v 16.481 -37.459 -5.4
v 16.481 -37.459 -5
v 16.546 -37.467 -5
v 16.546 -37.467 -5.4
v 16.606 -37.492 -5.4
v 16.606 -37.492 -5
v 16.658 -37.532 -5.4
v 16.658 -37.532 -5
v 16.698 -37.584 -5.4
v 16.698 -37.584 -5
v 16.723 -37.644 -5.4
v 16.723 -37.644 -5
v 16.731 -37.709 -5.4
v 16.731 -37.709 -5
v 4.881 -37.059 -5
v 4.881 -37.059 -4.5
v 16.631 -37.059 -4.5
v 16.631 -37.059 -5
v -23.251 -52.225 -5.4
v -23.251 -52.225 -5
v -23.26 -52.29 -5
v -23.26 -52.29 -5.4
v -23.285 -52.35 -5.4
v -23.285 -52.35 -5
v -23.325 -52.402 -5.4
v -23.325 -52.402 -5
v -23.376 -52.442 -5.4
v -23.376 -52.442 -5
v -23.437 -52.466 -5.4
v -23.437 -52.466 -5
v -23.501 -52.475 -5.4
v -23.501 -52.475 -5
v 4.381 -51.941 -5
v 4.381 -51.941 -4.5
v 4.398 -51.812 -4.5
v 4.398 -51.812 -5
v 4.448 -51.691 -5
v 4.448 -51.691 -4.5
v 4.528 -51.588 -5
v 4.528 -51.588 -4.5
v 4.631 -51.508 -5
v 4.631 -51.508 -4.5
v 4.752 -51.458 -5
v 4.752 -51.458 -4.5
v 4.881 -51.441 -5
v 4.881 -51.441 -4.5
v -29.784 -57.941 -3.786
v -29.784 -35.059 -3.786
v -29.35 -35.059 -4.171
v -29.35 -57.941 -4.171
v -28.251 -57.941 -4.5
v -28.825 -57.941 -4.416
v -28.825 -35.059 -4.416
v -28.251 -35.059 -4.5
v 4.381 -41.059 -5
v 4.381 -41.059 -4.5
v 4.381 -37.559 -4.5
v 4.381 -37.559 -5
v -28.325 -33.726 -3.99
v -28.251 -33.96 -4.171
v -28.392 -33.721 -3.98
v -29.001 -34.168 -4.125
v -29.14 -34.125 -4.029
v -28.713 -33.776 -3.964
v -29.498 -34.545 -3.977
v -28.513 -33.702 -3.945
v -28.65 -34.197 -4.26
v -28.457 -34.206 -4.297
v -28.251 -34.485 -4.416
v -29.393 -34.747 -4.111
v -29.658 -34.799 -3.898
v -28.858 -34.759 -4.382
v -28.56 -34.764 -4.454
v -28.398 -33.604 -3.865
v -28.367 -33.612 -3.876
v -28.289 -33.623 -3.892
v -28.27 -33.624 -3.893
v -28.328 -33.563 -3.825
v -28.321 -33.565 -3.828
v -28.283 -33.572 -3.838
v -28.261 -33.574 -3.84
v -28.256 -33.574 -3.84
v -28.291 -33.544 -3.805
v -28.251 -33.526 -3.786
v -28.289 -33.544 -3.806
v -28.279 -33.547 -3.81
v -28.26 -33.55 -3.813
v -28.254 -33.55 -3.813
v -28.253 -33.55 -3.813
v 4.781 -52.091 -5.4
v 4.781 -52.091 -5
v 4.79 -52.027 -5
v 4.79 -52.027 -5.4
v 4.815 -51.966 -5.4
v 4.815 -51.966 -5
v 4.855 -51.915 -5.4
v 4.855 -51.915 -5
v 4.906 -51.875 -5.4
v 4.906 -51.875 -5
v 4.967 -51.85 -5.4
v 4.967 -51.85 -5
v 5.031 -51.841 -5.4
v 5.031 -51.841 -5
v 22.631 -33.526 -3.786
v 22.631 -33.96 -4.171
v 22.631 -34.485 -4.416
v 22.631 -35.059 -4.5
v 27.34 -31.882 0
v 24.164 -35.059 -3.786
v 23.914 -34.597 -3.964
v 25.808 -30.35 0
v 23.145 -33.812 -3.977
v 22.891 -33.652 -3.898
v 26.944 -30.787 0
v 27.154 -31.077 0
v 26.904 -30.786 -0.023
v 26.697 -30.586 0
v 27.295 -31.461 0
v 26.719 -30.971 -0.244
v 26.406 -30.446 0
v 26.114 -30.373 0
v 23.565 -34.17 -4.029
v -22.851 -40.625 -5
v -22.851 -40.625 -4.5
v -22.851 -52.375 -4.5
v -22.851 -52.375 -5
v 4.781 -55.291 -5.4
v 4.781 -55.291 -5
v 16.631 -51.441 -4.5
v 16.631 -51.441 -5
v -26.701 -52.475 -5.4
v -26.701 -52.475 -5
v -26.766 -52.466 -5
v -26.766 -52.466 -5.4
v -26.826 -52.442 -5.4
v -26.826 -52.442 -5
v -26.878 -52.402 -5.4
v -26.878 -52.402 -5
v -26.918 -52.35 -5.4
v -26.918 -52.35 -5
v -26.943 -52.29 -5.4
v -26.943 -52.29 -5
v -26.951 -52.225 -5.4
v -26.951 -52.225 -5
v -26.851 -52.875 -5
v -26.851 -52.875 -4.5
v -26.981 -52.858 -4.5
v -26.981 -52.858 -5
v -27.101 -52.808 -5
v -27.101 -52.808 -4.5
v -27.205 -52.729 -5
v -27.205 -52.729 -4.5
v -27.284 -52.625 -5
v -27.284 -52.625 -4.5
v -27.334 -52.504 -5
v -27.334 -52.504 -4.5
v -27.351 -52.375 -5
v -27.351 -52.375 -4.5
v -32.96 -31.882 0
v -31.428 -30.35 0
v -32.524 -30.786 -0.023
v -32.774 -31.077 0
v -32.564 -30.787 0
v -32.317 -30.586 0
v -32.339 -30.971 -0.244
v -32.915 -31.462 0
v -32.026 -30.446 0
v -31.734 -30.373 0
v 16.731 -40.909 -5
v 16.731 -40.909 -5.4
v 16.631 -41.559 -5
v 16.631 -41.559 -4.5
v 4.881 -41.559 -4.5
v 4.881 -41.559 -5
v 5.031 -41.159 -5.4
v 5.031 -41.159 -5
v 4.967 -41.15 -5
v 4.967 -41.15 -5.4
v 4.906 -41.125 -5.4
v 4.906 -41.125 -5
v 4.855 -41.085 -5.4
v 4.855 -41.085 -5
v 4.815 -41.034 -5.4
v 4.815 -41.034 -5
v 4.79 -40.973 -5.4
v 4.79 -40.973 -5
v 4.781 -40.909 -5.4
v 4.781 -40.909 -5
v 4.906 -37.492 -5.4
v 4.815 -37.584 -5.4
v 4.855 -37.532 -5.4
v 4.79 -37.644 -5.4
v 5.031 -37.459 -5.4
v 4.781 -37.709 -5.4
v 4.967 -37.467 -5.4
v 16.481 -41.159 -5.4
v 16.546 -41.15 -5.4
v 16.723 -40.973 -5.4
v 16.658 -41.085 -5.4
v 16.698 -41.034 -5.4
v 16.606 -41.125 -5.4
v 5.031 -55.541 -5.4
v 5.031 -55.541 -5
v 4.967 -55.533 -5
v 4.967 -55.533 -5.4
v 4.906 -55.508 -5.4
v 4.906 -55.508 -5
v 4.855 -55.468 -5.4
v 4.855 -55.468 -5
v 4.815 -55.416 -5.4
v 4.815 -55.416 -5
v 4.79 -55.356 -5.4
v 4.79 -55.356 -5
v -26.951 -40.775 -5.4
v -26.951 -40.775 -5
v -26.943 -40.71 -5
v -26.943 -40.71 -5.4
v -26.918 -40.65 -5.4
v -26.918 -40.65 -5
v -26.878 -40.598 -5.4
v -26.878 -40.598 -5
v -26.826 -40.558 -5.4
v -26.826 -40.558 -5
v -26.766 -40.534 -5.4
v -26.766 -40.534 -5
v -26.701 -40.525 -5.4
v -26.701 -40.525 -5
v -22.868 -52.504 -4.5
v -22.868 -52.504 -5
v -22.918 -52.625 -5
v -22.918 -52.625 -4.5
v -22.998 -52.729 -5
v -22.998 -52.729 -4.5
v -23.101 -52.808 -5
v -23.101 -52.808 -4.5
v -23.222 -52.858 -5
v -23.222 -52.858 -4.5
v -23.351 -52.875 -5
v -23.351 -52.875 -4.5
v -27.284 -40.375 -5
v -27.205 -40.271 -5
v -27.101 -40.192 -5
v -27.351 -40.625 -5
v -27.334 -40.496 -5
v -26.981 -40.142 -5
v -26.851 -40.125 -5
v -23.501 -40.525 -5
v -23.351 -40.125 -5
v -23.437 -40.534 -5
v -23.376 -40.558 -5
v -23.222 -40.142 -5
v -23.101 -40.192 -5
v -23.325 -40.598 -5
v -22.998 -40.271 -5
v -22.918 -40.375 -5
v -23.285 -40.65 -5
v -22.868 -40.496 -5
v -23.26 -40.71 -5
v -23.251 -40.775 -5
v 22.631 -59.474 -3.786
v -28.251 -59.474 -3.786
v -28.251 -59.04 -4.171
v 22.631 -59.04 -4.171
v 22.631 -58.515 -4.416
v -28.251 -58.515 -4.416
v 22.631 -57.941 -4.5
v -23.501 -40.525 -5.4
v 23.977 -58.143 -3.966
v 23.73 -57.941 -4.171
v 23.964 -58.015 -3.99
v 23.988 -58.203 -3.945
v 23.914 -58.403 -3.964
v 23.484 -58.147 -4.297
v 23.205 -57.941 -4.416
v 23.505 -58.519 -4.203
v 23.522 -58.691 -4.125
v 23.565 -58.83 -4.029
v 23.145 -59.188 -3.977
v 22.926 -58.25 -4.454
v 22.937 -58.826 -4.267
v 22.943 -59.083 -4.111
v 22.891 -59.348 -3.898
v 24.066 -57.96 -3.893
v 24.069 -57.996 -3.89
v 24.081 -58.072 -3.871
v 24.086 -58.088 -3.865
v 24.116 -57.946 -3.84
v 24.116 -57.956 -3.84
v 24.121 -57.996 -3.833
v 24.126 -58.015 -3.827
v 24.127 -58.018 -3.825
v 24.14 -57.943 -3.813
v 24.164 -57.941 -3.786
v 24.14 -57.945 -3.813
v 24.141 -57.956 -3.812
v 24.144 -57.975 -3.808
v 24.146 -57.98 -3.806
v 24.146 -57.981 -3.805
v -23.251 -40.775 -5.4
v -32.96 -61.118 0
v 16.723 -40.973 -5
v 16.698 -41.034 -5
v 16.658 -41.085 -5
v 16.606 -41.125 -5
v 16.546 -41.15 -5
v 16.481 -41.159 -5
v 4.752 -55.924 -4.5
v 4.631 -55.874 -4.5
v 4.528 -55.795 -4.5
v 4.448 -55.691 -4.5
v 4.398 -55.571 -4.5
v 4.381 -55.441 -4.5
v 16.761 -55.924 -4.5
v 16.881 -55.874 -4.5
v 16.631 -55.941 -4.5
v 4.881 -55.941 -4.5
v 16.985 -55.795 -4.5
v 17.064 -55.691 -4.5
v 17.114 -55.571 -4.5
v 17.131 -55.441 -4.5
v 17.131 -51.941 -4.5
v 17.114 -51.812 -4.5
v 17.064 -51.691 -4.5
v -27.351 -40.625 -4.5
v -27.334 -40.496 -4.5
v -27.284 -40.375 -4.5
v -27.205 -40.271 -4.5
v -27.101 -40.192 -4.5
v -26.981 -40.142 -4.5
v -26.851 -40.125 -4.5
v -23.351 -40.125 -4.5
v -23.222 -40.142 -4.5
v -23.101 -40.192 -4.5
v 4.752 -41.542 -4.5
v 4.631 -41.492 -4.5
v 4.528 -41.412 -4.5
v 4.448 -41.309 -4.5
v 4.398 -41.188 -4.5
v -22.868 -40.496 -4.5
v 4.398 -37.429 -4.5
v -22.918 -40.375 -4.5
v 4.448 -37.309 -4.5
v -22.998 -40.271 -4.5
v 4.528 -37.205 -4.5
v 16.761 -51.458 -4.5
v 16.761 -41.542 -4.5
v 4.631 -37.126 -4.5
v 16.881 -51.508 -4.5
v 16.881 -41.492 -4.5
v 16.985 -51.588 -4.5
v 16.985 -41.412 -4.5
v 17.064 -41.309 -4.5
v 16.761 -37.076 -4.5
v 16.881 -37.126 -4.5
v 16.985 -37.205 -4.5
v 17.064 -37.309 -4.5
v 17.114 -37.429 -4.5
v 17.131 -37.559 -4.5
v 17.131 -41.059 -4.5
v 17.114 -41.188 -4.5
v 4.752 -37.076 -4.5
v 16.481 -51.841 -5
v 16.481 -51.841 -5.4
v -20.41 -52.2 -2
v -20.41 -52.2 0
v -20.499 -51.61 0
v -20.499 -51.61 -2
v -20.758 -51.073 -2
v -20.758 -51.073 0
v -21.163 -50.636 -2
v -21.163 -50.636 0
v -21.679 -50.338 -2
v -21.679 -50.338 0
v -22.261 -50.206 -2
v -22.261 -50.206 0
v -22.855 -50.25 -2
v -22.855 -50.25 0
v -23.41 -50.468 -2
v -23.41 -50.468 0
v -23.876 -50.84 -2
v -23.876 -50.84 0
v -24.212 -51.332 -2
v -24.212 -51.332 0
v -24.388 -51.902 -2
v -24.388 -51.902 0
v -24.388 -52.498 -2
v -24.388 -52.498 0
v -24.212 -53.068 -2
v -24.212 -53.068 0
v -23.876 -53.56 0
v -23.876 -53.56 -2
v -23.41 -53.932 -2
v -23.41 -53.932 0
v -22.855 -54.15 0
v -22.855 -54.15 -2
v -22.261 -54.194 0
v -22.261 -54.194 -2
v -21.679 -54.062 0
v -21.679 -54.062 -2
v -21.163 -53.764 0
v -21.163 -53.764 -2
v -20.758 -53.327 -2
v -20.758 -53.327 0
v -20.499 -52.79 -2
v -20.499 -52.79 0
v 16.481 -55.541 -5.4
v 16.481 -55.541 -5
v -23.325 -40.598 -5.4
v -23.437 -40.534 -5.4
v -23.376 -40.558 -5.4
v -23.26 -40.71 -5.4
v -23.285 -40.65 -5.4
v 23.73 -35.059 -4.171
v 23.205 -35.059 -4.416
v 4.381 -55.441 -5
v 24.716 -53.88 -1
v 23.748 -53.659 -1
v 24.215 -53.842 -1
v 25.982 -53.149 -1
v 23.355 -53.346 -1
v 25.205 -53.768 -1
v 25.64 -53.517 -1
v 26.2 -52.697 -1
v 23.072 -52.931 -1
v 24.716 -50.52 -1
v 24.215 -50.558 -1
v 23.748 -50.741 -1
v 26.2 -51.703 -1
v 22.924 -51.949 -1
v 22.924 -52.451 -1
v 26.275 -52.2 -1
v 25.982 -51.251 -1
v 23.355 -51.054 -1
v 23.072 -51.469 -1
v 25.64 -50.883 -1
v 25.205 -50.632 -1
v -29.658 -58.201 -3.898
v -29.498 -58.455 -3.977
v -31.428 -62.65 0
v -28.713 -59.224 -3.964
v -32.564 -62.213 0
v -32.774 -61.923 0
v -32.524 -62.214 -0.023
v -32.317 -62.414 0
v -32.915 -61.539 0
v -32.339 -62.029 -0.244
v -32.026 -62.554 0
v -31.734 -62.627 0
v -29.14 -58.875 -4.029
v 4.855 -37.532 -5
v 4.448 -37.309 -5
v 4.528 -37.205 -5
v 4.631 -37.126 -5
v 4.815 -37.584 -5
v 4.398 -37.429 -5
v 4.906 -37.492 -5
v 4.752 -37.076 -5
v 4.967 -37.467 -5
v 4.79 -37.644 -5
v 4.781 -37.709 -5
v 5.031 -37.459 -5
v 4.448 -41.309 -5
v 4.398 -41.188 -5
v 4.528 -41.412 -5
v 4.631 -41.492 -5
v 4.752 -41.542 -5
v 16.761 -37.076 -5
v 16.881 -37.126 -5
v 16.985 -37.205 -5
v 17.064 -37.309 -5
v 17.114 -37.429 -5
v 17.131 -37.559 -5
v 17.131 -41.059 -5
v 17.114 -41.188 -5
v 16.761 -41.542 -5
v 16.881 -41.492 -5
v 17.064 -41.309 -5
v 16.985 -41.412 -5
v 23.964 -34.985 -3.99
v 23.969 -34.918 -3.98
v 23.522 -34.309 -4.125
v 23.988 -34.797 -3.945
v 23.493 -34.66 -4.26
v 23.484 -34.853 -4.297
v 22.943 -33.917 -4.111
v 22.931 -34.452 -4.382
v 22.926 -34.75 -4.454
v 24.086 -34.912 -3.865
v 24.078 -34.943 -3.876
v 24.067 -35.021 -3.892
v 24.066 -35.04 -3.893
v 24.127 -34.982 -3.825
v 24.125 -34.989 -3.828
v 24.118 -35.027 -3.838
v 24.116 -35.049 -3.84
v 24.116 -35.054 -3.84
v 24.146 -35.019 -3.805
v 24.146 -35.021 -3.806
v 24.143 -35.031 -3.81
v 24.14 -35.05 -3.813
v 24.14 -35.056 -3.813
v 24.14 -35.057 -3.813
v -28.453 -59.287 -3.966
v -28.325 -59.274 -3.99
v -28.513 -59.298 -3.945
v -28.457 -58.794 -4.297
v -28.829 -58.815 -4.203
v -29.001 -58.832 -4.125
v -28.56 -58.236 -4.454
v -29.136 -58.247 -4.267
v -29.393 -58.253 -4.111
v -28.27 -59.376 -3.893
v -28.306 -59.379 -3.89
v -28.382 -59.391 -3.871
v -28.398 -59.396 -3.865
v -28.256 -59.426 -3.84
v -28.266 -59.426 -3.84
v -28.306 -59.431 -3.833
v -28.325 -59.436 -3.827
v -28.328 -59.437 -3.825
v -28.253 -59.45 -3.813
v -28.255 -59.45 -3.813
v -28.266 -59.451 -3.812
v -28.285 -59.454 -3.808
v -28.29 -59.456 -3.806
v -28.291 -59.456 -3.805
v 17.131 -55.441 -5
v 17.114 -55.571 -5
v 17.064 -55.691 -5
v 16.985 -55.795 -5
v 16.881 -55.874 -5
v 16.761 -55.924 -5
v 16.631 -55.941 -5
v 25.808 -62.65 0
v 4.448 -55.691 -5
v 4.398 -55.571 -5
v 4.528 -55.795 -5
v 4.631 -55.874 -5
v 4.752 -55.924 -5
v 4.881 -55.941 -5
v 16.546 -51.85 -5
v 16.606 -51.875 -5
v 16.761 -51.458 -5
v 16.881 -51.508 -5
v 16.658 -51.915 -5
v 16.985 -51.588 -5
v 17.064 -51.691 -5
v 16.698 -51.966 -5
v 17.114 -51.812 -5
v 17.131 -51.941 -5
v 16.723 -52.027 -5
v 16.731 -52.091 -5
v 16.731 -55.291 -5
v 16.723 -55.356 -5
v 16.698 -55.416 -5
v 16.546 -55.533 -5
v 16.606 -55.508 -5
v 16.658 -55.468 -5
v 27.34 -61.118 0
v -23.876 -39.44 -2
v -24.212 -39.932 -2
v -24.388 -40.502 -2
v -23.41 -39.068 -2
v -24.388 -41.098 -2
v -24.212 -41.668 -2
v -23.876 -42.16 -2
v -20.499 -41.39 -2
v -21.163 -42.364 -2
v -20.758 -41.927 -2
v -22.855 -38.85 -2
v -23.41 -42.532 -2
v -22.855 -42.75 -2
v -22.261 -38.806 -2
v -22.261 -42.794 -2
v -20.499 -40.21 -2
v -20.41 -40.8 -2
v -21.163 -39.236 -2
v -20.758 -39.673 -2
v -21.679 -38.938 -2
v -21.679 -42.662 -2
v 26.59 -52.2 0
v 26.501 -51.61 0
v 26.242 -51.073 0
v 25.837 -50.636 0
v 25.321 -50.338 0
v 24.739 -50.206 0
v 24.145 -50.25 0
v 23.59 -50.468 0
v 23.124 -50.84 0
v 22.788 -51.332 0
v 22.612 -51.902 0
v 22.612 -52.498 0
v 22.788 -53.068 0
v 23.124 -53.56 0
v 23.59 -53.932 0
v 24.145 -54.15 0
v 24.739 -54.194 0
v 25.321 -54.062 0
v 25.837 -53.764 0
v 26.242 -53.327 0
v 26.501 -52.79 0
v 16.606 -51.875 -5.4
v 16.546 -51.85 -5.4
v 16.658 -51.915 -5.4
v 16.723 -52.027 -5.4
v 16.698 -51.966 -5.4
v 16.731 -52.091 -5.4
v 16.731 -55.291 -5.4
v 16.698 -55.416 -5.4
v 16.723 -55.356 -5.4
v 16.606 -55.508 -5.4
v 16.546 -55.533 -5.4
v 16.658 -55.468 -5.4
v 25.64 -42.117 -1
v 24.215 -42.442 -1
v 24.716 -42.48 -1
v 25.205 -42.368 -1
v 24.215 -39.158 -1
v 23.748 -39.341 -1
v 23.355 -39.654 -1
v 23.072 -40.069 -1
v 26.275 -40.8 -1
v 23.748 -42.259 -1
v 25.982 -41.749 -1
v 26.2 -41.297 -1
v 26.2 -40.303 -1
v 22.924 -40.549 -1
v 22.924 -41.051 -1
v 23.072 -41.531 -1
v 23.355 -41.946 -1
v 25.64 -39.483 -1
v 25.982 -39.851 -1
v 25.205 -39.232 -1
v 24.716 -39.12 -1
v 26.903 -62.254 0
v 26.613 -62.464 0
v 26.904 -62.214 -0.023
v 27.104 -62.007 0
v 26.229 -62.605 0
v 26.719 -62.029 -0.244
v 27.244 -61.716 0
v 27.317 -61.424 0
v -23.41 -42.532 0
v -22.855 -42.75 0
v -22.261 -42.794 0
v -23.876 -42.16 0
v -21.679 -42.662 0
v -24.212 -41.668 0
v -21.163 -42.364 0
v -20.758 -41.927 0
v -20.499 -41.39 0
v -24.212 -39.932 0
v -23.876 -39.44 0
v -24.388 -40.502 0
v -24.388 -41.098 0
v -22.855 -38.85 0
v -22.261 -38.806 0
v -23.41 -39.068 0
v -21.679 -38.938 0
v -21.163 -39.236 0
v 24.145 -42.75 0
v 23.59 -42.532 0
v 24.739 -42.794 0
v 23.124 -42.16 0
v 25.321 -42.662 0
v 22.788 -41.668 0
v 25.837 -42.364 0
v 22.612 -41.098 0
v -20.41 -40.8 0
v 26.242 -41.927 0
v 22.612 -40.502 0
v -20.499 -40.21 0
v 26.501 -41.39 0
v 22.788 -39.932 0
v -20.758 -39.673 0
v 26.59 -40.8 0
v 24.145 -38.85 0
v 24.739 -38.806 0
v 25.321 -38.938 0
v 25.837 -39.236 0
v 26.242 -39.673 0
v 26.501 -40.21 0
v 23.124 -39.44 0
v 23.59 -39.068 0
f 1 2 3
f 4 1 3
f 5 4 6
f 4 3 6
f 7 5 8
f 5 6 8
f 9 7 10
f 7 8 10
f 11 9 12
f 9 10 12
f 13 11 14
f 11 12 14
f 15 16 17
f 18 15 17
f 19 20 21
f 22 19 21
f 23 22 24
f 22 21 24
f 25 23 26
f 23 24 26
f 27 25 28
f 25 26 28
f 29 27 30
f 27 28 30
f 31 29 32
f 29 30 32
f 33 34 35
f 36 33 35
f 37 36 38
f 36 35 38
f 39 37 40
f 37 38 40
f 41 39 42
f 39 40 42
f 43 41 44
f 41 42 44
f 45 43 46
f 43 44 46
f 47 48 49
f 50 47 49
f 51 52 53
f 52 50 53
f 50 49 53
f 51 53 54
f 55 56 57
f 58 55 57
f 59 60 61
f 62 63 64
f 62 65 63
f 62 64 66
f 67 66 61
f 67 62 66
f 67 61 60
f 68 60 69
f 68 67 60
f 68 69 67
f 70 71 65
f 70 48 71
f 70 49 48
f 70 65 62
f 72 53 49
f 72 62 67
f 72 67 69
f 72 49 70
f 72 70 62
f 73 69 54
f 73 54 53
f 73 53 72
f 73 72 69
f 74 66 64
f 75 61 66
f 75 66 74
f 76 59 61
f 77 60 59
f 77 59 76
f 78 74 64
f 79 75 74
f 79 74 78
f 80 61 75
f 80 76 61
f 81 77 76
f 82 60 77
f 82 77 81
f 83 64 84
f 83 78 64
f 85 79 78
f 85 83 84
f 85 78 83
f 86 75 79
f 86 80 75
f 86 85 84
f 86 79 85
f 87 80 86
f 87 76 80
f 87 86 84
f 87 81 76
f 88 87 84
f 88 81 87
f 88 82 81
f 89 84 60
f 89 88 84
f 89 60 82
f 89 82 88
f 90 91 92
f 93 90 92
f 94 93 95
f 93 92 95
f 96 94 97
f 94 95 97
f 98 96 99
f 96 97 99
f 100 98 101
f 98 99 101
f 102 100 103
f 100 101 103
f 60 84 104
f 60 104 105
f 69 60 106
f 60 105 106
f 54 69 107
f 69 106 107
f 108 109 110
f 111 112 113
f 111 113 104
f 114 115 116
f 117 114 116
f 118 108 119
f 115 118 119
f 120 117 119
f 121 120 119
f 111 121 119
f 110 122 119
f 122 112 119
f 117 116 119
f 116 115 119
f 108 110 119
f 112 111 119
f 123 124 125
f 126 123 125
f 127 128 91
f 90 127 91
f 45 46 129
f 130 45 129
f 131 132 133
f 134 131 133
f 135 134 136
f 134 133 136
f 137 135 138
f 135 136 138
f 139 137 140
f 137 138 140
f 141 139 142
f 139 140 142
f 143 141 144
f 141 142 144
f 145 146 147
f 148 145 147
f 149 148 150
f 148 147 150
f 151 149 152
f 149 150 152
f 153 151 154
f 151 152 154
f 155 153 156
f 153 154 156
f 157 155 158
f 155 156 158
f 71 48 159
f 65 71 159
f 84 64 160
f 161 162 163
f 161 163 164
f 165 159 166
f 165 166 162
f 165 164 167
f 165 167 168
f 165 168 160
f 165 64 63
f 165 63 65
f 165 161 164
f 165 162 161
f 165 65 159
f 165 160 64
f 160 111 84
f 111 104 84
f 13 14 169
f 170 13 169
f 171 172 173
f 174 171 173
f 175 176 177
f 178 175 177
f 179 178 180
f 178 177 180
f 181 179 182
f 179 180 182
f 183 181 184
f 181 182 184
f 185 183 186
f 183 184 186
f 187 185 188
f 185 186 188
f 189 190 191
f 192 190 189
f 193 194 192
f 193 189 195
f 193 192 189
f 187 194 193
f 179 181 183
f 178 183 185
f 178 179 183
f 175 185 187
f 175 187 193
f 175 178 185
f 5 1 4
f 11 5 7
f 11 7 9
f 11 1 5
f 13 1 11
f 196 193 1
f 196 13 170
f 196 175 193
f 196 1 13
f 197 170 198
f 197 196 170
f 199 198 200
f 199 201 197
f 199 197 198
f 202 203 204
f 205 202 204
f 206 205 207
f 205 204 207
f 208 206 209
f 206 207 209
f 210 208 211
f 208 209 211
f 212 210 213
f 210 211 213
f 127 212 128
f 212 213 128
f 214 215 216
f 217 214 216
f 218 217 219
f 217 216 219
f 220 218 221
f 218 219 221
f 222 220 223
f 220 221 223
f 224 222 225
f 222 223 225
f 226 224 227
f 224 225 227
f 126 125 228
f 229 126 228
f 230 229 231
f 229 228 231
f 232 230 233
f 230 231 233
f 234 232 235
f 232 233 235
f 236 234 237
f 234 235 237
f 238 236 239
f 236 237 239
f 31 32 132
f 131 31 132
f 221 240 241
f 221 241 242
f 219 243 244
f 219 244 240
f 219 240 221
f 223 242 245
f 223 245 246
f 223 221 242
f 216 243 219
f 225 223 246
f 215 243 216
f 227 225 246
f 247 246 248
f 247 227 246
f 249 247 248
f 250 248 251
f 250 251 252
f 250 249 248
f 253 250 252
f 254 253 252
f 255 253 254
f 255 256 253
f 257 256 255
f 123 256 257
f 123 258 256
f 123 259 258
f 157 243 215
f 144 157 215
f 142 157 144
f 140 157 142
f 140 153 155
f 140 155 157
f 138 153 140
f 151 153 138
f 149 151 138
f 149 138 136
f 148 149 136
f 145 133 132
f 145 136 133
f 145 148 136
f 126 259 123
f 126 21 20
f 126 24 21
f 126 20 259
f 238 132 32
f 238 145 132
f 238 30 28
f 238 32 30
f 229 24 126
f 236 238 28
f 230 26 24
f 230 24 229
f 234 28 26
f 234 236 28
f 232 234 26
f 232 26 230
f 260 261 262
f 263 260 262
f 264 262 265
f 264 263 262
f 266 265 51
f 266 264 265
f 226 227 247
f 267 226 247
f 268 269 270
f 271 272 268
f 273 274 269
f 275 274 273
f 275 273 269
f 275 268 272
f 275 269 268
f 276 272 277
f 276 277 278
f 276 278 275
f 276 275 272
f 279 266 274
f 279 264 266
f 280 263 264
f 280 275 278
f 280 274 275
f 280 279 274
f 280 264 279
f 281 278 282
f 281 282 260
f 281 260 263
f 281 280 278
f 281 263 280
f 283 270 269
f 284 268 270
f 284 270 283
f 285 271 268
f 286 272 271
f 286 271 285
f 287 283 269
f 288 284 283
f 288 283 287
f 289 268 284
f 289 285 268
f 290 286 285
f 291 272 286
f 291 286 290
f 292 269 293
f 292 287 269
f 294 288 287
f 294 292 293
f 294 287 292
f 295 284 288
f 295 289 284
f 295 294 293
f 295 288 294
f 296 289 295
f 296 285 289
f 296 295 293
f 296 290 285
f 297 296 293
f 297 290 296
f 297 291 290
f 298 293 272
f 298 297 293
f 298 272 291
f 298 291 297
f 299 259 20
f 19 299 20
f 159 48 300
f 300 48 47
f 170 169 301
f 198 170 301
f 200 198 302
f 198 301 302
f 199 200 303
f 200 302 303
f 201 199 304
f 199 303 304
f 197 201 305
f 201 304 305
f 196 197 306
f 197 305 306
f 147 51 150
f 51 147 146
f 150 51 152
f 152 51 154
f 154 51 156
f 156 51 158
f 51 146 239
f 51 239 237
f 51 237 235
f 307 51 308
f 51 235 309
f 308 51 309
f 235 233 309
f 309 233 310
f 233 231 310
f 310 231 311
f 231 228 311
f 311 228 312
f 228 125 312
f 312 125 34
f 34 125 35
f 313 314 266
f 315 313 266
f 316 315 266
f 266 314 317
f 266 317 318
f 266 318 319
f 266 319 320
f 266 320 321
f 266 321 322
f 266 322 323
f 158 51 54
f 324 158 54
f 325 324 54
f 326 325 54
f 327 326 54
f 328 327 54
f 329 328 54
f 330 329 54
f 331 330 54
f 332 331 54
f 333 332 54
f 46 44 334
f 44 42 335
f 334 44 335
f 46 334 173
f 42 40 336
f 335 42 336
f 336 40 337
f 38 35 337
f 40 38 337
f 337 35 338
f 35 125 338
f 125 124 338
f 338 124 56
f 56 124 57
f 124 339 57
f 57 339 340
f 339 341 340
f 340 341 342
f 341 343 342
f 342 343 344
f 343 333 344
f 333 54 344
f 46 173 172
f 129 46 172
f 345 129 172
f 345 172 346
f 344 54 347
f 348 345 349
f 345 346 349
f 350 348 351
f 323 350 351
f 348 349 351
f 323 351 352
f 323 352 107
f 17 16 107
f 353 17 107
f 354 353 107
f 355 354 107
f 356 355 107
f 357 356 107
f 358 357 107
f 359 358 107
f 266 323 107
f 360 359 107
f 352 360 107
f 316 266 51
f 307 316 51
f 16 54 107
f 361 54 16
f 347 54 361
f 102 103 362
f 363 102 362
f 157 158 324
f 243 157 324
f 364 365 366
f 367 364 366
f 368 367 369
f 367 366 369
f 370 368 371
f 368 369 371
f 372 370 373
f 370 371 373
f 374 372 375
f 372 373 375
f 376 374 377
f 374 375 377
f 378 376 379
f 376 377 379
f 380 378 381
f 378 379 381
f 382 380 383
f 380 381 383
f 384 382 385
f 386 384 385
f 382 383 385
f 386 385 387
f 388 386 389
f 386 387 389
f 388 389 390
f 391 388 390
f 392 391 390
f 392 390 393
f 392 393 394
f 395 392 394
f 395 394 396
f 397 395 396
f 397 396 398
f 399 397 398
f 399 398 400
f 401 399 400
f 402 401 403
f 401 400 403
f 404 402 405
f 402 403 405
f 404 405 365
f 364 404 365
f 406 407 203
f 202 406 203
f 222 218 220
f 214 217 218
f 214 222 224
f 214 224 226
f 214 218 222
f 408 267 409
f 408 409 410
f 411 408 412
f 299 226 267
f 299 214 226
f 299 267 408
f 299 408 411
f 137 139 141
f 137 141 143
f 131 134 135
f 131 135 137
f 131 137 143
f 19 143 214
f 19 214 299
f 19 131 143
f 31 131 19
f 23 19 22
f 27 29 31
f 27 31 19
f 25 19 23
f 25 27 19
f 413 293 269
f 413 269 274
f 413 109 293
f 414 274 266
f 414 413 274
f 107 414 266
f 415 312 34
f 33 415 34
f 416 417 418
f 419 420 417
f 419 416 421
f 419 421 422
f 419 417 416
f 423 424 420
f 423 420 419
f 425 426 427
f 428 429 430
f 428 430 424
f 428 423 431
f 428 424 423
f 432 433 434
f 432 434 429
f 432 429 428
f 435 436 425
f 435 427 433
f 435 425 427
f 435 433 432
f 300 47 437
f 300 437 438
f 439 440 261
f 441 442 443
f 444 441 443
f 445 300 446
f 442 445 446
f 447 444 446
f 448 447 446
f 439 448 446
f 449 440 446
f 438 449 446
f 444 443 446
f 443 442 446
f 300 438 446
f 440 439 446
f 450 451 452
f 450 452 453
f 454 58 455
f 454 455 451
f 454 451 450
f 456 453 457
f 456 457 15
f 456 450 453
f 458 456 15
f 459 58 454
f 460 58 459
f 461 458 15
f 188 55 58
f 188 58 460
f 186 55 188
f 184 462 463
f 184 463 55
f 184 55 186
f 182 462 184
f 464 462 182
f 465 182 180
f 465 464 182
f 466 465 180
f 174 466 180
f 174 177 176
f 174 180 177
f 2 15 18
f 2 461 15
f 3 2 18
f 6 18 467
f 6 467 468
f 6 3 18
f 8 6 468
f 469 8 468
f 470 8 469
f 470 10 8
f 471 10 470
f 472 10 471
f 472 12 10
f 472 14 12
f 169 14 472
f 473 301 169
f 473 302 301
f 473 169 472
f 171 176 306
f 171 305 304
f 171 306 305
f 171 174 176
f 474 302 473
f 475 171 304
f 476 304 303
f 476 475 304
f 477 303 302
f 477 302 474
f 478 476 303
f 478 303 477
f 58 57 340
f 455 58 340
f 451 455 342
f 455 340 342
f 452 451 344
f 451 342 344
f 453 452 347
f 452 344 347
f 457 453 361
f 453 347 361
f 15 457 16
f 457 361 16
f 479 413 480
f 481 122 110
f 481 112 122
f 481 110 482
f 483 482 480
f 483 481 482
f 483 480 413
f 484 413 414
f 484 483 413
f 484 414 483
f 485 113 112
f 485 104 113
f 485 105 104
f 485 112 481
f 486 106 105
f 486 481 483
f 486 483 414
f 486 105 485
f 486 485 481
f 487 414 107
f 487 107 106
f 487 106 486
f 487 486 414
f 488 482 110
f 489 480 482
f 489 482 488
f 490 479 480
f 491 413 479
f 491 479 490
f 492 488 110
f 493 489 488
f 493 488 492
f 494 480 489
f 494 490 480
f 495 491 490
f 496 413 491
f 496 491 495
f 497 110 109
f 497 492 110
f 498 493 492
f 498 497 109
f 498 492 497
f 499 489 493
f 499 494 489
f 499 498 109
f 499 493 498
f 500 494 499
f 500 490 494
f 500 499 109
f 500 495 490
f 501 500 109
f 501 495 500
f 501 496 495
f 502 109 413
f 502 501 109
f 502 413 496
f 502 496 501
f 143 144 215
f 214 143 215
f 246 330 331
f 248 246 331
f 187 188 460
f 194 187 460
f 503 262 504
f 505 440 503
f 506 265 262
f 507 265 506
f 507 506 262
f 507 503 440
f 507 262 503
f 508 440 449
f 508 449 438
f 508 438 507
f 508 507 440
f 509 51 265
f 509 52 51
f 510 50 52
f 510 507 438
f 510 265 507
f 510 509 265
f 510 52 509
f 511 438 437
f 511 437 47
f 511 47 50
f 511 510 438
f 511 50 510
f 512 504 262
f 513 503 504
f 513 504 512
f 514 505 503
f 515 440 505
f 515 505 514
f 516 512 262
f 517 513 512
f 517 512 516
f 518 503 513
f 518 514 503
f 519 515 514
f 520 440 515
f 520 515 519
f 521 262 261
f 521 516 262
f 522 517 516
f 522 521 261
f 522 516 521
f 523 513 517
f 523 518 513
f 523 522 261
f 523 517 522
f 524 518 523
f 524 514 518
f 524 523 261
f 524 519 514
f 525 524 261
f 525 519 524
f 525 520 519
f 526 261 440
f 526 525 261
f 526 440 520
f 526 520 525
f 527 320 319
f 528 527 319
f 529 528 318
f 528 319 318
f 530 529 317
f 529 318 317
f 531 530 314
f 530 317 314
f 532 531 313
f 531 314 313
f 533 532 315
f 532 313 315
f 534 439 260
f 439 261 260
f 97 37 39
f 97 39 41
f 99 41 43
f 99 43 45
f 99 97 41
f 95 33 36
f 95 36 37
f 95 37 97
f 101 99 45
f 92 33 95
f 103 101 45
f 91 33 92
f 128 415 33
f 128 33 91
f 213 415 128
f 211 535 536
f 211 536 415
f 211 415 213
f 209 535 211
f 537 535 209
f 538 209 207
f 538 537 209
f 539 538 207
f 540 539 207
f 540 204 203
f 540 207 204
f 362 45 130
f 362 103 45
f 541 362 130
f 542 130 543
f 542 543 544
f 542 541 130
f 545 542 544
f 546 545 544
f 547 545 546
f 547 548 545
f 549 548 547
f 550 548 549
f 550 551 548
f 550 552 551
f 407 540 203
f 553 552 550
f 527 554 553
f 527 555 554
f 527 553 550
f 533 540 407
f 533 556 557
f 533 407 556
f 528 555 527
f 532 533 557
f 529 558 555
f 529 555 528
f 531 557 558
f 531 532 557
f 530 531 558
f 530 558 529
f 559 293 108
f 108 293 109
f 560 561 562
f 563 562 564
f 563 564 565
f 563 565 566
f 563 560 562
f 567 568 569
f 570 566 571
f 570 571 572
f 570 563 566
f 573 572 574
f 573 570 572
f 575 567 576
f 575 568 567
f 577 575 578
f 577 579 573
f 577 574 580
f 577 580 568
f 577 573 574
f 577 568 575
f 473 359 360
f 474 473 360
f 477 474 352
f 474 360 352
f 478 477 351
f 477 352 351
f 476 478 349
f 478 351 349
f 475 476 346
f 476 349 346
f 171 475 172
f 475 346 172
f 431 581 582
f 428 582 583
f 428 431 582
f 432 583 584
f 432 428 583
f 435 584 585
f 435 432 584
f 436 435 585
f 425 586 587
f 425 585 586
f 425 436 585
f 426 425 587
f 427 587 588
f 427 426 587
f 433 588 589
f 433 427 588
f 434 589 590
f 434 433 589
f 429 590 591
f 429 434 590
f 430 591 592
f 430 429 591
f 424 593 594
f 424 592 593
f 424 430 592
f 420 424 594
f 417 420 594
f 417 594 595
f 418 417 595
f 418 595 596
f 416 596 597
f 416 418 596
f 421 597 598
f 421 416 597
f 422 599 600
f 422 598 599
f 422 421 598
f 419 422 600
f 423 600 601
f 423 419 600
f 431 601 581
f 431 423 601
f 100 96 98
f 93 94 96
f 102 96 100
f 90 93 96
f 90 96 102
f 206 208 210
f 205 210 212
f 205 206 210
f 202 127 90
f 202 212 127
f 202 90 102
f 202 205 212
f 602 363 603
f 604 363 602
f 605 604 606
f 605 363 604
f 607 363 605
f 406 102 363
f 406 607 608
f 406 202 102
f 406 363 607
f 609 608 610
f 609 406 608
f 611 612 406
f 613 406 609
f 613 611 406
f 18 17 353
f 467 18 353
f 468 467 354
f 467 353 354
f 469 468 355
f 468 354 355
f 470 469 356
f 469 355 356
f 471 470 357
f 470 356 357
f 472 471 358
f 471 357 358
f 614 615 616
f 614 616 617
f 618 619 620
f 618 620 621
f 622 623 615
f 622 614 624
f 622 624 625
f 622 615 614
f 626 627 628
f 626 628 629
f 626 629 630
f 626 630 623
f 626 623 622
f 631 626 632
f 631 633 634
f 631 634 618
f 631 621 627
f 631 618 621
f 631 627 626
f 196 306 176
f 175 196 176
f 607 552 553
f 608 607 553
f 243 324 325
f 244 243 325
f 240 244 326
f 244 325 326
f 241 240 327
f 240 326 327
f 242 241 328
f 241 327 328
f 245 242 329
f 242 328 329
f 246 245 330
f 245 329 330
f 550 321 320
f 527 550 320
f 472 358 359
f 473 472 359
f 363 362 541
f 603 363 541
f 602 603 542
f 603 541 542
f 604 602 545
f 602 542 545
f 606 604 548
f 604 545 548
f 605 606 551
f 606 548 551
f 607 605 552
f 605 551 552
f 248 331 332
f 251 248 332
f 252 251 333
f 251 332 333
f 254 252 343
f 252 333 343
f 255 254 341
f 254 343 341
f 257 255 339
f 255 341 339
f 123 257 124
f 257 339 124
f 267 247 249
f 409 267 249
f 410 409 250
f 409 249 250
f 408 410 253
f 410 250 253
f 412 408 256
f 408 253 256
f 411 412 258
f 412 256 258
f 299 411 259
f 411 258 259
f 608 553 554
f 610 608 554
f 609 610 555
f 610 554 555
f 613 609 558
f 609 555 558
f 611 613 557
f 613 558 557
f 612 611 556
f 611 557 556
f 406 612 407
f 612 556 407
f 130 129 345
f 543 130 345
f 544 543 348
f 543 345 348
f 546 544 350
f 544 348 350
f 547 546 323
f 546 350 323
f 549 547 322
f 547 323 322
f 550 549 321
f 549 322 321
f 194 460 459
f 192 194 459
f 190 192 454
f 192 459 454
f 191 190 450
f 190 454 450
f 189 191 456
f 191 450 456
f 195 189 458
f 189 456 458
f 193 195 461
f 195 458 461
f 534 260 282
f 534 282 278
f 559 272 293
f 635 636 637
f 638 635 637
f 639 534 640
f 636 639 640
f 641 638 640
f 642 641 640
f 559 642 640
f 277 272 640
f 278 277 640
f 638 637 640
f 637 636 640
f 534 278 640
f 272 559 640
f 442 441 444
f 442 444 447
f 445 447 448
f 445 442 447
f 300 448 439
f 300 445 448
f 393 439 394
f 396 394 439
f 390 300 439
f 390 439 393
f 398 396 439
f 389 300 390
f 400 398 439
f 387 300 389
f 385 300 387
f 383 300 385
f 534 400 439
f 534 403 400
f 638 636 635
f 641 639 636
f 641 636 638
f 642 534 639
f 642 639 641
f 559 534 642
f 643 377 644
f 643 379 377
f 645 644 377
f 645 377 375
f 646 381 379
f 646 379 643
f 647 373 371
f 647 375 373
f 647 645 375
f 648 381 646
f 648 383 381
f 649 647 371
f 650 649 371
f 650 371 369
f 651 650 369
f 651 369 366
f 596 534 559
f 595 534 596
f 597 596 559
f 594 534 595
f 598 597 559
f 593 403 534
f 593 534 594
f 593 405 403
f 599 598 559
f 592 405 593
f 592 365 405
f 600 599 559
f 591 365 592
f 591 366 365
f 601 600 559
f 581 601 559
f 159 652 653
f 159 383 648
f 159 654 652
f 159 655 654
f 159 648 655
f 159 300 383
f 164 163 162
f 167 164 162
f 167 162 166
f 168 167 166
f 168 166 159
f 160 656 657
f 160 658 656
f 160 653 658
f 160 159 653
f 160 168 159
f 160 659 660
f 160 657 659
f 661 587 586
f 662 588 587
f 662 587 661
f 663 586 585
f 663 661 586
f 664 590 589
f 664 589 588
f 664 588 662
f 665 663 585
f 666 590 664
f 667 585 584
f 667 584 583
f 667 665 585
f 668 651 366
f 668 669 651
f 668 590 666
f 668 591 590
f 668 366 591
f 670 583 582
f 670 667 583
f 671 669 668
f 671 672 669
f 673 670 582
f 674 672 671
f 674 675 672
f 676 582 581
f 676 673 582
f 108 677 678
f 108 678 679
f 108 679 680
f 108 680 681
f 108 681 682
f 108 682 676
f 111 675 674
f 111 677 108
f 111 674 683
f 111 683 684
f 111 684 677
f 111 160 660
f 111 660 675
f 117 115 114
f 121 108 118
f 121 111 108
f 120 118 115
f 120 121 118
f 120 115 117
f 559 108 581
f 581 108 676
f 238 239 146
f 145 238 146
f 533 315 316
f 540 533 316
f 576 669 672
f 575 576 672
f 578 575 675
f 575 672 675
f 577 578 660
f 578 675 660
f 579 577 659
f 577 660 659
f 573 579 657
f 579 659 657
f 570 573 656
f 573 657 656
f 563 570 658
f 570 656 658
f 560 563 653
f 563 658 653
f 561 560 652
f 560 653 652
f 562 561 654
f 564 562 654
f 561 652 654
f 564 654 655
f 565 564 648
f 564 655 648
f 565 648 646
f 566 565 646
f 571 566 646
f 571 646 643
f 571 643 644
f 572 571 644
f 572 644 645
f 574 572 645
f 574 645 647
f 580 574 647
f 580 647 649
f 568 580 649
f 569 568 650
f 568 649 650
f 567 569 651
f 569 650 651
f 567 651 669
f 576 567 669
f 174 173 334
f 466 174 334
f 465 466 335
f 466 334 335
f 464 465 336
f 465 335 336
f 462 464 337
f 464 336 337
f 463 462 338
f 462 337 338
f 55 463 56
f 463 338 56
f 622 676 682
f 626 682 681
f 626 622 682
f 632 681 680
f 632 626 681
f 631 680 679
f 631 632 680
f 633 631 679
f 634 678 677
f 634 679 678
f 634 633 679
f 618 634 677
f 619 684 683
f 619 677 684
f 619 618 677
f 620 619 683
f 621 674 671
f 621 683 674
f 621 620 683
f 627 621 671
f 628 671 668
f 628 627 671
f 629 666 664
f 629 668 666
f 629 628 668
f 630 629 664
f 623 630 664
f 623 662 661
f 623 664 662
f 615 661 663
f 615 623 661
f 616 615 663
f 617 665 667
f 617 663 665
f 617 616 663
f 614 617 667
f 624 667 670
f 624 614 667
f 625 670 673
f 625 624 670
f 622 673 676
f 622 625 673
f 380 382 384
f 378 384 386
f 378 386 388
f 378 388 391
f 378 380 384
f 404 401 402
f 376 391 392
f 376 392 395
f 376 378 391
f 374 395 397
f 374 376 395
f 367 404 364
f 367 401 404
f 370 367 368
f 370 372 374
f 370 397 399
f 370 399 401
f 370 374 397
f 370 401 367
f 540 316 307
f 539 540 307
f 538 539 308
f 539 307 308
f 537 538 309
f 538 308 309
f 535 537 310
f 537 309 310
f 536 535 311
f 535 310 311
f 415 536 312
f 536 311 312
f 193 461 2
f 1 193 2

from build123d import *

# Parameters (mm, degrees)
SKETCH011_W     = 60.3
SKETCH011_H     = 32.3
PAD003_DEPTH    = 4.5
PAD003_TAPER    = 40
FILLET001_R     = 2
PAD004_DEPTH    = 0.5
PAD005_DEPTH    = 0.4
SKETCH014_R     = 2
POCKET008_DEPTH = 2
SKETCH015_R     = 2
POCKET009_DEPTH = 1
POCKET009_TAPER = 17.5


with BuildPart() as part:
    # Sketch011 → Pad003 (new body)
    with BuildSketch(Plane.XY):
        with Locations((-2.81, -16.15)):
            Rectangle(SKETCH011_W, SKETCH011_H)
    extrude(amount=-PAD003_DEPTH, taper=PAD003_TAPER)

    # Fillet001
    fillet001_edges = [part.edges().sort_by_distance(p)[0] for p in [
        (-29.184052, -16.15, -4.5),
        (-31.072026, -1.887974, -2.25),
        (-2.81, -3.775948, -4.5),
        (-2.81, -28.524052, -4.5),
        (25.452026, -1.887974, -2.25),
        (23.564052, -16.15, -4.5),
        (25.452026, -30.412026, -2.25),
        (-31.072026, -30.412026, -2.25),
    ]]
    fillet(fillet001_edges, radius=FILLET001_R)

    # Sketch012 (on Face13 of Fillet001) → Pad004 (join)
    with BuildSketch(Plane(origin=(0, 0, -4.5), x_dir=(1, 0, 0), z_dir=(0, 0, -1))):
        with BuildLine():
            Line((4.381436, 25.091436), (4.381436, 21.591436))
            ThreePointArc((4.381436, 21.591436), (4.527883, 21.237883), (4.881436, 21.091436))
            Line((4.881436, 21.091436), (16.631436, 21.091436))
            ThreePointArc((16.631436, 21.091436), (16.98499, 21.237883), (17.131436, 21.591436))
            Line((17.131436, 21.591436), (17.131436, 25.091436))
            ThreePointArc((17.131436, 25.091436), (16.98499, 25.44499), (16.631436, 25.591436))
            Line((16.631436, 25.591436), (4.881436, 25.591436))
            ThreePointArc((4.881436, 25.591436), (4.527883, 25.44499), (4.381436, 25.091436))
        make_face()
        with BuildLine():
            Line((4.381436, 10.708564), (4.381436, 7.208564))
            ThreePointArc((4.381436, 7.208564), (4.527883, 6.85501), (4.881436, 6.708564))
            Line((4.881436, 6.708564), (16.631436, 6.708564))
            ThreePointArc((16.631436, 6.708564), (16.98499, 6.85501), (17.131436, 7.208564))
            Line((17.131436, 7.208564), (17.131436, 10.708564))
            ThreePointArc((17.131436, 10.708564), (16.98499, 11.062117), (16.631436, 11.208564))
            Line((16.631436, 11.208564), (4.881436, 11.208564))
            ThreePointArc((4.881436, 11.208564), (4.527883, 11.062117), (4.381436, 10.708564))
        make_face()
        with BuildLine():
            Line((-27.351436, 22.025), (-27.351436, 10.275))
            ThreePointArc((-27.351436, 10.275), (-27.20499, 9.921447), (-26.851436, 9.775))
            Line((-26.851436, 9.775), (-23.351436, 9.775))
            ThreePointArc((-23.351436, 9.775), (-22.997883, 9.921447), (-22.851436, 10.275))
            Line((-22.851436, 10.275), (-22.851436, 22.025))
            ThreePointArc((-22.851436, 22.025), (-22.997883, 22.378553), (-23.351436, 22.525))
            Line((-23.351436, 22.525), (-26.851436, 22.525))
            ThreePointArc((-26.851436, 22.525), (-27.20499, 22.378553), (-27.351436, 22.025))
        make_face()
    extrude(amount=PAD004_DEPTH)

    # Sketch013 (on Face45 of Pad004) → Pad005 (join)
    with BuildSketch(Plane(origin=(0, 0, -5), x_dir=(1, 0, 0), z_dir=(0, 0, -1))):
        with BuildLine():
            Line((4.781436, 24.941436), (4.781436, 21.741436))
            ThreePointArc((4.781436, 21.741436), (4.85466, 21.56466), (5.031436, 21.491436))
            Line((5.031436, 21.491436), (16.481436, 21.491436))
            ThreePointArc((16.481436, 21.491436), (16.658213, 21.56466), (16.731436, 21.741436))
            Line((16.731436, 21.741436), (16.731436, 24.941436))
            ThreePointArc((16.731436, 24.941436), (16.658213, 25.118213), (16.481436, 25.191436))
            Line((16.481436, 25.191436), (5.031436, 25.191436))
            ThreePointArc((5.031436, 25.191436), (4.85466, 25.118213), (4.781436, 24.941436))
        make_face()
        with BuildLine():
            Line((4.781436, 10.558564), (4.781436, 7.358564))
            ThreePointArc((4.781436, 7.358564), (4.85466, 7.181787), (5.031436, 7.108564))
            Line((5.031436, 7.108564), (16.481436, 7.108564))
            ThreePointArc((16.481436, 7.108564), (16.658213, 7.181787), (16.731436, 7.358564))
            Line((16.731436, 7.358564), (16.731436, 10.558564))
            ThreePointArc((16.731436, 10.558564), (16.658213, 10.73534), (16.481436, 10.808564))
            Line((16.481436, 10.808564), (5.031436, 10.808564))
            ThreePointArc((5.031436, 10.808564), (4.85466, 10.73534), (4.781436, 10.558564))
        make_face()
        with BuildLine():
            Line((-26.951436, 21.875), (-26.951436, 10.425))
            ThreePointArc((-26.951436, 10.425), (-26.878213, 10.248223), (-26.701436, 10.175))
            Line((-26.701436, 10.175), (-23.501436, 10.175))
            ThreePointArc((-23.501436, 10.175), (-23.32466, 10.248223), (-23.251436, 10.425))
            Line((-23.251436, 10.425), (-23.251436, 21.875))
            ThreePointArc((-23.251436, 21.875), (-23.32466, 22.051777), (-23.501436, 22.125))
            Line((-23.501436, 22.125), (-26.701436, 22.125))
            ThreePointArc((-26.701436, 22.125), (-26.878213, 22.051777), (-26.951436, 21.875))
        make_face()
    extrude(amount=PAD005_DEPTH)

    # Sketch014 → Pocket008 (cut)
    with BuildSketch(Plane.XY):
        with Locations((-22.41, -10.45)):
            Circle(SKETCH014_R)
        with Locations((-22.41, -21.85)):
            Circle(SKETCH014_R)
    extrude(amount=-POCKET008_DEPTH, mode=Mode.SUBTRACT)

    # Sketch015 → Pocket009 (cut)
    with BuildSketch(Plane.XY):
        with Locations((24.59, -10.45)):
            Circle(SKETCH015_R)
        with Locations((24.59, -21.85)):
            Circle(SKETCH015_R)
    extrude(amount=-POCKET009_DEPTH, taper=POCKET009_TAPER, mode=Mode.SUBTRACT)


with BuildPart() as part_1:
    # Body002 placement: moved
    add(part.part.moved(Location((0, -30.35, 0))))


solid = part_1.part
